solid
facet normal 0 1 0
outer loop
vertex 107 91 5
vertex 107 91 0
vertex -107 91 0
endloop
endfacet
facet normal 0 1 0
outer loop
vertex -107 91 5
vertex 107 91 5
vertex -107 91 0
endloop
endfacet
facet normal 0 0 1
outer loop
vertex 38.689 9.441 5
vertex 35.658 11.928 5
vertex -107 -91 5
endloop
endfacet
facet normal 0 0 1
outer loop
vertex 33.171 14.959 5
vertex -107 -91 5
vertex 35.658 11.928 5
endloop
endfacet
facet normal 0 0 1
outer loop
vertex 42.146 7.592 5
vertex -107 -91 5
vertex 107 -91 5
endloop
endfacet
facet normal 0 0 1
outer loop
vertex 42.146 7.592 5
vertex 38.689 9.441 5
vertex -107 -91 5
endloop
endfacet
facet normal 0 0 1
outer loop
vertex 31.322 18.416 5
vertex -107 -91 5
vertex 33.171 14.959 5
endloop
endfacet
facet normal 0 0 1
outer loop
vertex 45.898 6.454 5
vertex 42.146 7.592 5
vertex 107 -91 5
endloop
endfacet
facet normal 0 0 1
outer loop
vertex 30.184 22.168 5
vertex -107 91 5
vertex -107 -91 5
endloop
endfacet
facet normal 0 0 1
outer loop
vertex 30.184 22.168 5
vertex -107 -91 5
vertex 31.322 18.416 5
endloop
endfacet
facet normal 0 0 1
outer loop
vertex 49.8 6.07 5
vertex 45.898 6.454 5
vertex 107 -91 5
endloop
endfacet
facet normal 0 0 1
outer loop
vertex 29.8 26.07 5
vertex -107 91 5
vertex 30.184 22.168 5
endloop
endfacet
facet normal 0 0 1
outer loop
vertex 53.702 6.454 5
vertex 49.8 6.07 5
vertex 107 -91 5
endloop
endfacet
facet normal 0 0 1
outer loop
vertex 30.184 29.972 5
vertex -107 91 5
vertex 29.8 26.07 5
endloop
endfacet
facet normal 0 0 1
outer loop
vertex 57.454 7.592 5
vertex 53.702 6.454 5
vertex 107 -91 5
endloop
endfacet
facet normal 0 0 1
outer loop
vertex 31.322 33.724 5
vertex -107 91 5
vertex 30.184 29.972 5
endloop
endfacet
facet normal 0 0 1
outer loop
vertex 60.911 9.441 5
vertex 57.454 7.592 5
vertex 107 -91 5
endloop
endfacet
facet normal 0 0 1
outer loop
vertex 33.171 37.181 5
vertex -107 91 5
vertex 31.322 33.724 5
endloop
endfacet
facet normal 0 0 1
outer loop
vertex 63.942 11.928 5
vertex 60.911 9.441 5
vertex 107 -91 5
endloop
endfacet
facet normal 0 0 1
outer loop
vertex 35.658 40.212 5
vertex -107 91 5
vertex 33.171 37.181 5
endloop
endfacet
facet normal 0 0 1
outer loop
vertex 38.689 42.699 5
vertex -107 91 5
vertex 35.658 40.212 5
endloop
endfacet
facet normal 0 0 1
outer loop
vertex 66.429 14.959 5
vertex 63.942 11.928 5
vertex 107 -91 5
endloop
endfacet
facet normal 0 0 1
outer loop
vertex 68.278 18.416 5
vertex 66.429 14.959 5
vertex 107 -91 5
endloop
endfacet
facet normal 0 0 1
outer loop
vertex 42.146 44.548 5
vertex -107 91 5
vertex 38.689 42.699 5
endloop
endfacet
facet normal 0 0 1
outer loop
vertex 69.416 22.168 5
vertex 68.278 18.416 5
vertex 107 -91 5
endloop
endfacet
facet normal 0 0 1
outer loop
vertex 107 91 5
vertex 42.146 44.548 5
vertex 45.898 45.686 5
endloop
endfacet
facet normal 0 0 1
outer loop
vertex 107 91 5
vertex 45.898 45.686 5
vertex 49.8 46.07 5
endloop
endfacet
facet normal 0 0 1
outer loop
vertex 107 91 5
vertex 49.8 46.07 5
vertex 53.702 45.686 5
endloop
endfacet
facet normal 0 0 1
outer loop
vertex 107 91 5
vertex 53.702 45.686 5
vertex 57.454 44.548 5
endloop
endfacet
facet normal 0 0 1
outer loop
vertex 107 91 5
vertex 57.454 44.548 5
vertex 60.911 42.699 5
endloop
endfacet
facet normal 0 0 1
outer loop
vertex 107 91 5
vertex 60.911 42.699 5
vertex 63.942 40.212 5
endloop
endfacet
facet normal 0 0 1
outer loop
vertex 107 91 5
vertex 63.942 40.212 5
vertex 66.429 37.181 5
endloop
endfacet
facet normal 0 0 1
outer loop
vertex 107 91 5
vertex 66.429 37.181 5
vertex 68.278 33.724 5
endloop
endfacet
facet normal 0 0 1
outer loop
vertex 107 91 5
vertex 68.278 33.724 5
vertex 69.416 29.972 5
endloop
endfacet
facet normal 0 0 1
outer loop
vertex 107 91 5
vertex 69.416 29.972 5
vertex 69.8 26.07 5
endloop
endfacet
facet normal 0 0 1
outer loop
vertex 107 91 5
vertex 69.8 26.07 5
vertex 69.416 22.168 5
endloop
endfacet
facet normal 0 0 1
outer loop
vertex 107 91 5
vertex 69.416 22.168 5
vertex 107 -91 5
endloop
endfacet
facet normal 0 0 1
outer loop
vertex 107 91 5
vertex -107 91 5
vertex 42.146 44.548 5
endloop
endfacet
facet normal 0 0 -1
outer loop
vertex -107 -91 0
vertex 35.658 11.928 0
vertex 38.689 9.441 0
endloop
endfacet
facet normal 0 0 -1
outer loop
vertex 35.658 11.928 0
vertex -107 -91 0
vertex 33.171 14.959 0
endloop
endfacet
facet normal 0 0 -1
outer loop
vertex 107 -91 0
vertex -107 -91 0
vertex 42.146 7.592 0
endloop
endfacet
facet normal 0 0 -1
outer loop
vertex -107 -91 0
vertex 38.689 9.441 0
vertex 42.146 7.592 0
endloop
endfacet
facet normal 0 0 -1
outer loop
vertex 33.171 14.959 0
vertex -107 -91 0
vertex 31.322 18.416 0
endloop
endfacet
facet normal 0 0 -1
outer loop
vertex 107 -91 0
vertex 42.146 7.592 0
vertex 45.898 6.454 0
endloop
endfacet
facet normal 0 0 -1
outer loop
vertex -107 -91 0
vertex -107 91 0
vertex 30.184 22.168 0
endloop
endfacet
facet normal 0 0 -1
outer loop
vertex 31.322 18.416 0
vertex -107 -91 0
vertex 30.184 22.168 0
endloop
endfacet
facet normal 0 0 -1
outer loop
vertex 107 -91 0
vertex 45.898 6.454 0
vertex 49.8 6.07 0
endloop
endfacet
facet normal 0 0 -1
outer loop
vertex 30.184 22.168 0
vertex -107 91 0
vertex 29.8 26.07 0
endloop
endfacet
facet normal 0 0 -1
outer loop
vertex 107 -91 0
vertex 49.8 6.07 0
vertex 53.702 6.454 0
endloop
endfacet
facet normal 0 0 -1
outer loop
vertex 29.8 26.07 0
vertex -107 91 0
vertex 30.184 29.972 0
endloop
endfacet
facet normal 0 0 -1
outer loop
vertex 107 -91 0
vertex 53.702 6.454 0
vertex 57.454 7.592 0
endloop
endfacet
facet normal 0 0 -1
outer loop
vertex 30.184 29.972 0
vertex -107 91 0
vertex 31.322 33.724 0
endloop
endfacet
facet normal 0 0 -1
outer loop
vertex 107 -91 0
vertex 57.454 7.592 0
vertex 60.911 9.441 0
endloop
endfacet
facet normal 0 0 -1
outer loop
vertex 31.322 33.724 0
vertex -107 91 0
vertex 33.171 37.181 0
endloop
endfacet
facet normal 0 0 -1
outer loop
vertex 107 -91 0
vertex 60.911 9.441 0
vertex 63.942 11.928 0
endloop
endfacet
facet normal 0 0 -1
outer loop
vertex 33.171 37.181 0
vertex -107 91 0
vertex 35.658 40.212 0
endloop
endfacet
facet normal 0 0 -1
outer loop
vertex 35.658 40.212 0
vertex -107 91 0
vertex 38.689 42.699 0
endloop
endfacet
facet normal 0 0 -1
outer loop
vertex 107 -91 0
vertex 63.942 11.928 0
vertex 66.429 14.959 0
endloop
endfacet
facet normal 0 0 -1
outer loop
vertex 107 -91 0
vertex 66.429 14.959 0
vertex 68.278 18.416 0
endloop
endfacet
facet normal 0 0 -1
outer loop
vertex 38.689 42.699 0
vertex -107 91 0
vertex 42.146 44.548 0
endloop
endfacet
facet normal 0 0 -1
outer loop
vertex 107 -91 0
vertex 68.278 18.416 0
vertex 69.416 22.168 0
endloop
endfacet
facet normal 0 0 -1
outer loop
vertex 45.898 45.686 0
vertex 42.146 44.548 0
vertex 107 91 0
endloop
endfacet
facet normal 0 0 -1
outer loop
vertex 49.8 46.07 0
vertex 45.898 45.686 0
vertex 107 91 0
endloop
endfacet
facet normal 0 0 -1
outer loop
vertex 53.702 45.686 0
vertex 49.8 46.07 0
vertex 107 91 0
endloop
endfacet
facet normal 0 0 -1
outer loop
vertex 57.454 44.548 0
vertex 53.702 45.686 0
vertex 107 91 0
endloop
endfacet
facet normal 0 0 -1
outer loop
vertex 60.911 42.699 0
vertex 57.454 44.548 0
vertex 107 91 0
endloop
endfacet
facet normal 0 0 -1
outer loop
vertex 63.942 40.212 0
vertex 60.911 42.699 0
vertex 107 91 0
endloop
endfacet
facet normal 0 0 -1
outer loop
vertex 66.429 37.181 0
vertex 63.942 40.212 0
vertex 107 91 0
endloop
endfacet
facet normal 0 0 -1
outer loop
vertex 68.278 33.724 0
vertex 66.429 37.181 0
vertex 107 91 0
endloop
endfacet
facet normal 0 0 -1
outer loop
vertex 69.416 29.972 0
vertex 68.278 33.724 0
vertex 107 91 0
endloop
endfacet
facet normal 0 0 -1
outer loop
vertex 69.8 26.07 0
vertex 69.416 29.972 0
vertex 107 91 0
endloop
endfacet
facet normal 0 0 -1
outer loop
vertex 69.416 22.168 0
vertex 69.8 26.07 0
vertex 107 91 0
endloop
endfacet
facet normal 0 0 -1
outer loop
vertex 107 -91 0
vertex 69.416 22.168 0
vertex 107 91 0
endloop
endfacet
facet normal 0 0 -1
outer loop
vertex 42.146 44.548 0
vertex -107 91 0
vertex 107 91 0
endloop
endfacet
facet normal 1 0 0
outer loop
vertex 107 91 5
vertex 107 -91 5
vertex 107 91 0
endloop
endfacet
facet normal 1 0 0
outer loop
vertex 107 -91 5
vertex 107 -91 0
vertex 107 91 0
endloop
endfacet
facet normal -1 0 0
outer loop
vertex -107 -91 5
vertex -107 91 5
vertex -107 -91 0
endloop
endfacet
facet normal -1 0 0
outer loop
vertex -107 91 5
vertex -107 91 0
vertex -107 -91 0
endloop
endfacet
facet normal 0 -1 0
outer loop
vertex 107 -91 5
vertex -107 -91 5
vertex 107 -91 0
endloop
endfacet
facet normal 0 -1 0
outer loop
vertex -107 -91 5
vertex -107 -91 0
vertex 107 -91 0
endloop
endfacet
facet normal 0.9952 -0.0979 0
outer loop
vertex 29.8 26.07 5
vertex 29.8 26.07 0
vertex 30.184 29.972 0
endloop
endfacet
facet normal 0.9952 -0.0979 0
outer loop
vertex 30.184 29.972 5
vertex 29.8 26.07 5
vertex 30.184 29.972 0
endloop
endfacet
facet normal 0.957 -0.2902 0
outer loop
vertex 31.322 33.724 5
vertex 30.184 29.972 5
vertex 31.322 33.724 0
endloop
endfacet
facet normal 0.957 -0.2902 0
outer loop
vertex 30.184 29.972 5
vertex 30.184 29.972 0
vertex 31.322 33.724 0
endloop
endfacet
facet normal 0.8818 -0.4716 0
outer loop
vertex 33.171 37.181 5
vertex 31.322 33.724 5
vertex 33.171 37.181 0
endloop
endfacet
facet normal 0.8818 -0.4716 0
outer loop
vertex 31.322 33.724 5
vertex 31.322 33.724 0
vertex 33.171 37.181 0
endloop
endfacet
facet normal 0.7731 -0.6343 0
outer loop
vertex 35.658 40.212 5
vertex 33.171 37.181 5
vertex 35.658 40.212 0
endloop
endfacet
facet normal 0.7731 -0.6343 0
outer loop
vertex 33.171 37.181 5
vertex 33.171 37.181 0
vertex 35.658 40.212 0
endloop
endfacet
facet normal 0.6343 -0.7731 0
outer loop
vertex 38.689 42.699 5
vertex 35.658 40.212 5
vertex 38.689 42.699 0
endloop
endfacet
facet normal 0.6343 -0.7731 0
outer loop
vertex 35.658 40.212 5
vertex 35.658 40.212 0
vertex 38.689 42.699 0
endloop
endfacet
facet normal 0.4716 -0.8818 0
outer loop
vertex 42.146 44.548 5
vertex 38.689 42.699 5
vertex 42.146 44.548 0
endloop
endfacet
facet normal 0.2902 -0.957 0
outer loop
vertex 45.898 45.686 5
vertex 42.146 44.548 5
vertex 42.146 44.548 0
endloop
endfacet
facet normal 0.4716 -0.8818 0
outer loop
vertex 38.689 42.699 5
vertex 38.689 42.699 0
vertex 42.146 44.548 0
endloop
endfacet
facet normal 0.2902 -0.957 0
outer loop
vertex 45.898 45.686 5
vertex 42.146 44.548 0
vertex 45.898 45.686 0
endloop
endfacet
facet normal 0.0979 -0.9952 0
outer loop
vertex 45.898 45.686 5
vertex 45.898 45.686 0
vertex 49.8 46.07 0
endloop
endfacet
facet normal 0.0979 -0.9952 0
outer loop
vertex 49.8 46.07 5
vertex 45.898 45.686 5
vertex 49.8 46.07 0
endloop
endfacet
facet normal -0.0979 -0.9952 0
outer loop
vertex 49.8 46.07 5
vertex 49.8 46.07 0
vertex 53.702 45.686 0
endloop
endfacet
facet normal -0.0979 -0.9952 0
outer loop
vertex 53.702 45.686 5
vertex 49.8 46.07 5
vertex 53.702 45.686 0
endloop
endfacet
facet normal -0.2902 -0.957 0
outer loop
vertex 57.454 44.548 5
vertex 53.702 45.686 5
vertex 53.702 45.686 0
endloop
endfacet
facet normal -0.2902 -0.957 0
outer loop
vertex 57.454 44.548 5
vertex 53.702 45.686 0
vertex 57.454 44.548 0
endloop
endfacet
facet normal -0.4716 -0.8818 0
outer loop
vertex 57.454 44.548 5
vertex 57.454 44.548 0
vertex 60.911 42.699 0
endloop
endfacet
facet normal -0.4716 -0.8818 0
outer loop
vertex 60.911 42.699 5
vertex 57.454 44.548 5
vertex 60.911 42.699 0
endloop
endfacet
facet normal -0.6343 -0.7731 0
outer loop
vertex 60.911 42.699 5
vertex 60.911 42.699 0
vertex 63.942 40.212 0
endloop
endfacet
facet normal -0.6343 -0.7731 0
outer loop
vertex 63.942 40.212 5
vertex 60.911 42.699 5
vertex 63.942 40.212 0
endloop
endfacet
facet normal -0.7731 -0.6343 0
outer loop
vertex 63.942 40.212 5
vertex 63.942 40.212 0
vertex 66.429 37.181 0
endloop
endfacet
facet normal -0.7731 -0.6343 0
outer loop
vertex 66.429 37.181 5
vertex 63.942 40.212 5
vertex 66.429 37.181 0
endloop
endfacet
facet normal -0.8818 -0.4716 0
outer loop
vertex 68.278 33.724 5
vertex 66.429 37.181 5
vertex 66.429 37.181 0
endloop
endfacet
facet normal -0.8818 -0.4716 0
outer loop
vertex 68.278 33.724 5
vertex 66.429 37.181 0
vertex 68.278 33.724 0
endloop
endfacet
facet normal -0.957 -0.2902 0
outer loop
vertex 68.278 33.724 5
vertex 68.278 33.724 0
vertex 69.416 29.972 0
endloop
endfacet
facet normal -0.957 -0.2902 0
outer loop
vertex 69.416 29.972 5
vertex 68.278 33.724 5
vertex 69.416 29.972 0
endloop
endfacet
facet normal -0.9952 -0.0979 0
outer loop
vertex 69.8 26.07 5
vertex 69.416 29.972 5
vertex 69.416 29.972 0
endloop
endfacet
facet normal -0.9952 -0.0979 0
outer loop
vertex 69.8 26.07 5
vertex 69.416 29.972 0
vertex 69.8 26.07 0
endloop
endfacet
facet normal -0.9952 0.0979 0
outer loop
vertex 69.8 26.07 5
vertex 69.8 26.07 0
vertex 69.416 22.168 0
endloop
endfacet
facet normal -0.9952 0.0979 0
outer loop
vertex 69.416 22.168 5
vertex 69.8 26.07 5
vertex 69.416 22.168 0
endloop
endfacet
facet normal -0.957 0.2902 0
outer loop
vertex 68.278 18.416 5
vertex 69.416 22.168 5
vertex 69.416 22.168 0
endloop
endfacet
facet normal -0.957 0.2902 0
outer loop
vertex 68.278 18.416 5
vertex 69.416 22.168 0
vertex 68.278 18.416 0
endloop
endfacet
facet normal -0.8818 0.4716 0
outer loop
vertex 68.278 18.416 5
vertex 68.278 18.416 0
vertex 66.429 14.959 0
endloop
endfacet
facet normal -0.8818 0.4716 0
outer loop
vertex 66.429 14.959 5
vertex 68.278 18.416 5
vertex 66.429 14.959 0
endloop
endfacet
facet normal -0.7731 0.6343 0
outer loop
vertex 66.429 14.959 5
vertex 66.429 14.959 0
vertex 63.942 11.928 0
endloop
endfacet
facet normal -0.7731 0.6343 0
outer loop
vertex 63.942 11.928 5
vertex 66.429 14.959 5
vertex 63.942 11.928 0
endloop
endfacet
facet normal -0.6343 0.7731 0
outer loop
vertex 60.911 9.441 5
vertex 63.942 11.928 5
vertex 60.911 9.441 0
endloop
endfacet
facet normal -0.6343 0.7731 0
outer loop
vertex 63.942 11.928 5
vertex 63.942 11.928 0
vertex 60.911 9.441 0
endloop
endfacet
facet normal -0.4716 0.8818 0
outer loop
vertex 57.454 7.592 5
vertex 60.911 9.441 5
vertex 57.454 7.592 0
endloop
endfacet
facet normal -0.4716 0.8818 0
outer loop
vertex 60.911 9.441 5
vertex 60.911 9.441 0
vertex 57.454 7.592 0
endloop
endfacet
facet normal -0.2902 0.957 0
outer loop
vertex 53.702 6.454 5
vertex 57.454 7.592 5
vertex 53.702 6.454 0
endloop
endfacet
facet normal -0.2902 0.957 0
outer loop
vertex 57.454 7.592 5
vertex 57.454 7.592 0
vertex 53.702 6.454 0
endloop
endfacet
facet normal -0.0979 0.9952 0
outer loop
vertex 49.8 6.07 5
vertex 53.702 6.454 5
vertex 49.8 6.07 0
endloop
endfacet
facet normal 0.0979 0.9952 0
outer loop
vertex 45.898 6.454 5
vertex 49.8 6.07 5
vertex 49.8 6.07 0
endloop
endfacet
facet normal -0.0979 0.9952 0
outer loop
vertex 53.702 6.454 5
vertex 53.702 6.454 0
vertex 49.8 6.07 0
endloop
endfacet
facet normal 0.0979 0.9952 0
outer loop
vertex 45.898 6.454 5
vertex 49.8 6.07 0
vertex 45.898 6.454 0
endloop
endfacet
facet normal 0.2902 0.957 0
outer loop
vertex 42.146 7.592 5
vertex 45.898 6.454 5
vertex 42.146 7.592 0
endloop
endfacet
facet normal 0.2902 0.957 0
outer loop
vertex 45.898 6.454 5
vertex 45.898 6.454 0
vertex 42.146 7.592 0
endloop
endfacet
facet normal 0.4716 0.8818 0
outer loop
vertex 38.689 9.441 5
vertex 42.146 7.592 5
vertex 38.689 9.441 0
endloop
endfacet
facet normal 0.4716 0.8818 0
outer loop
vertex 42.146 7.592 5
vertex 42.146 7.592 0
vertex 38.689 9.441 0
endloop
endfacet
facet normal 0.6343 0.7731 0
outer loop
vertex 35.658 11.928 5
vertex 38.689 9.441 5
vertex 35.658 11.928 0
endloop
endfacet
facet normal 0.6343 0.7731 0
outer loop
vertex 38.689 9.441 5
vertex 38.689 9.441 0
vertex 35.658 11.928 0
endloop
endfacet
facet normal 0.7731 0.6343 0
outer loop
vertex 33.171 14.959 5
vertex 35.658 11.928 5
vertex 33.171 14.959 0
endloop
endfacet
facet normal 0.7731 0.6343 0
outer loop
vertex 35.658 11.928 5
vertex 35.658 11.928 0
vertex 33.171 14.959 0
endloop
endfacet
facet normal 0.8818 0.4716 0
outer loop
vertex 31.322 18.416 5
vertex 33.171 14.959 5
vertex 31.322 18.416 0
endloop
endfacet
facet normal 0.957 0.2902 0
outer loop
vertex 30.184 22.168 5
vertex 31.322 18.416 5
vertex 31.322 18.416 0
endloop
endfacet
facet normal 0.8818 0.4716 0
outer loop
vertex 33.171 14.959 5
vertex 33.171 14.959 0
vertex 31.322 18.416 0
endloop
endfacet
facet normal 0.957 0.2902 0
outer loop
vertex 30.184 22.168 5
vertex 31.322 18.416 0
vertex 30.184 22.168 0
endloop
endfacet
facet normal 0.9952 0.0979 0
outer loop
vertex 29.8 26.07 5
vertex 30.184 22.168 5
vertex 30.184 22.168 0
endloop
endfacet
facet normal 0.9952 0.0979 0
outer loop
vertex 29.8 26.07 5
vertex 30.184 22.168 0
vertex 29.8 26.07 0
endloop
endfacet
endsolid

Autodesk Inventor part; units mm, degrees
ref_plane "YZ Plane" through (0, 0, 0) normal (1, 0, 0) x (0, 1, 0)
ref_plane "XZ Plane" through (0, 0, 0) normal (0, 1, 0) x (-1, 0, 0)
ref_plane "XY Plane" through (0, 0, 0) normal (0, 0, 1) x (1, 0, 0)
sketch "Sketch1" plane through (0, 0, 0) normal (0, 0, 1) x (1, 0, 0)
  line L0 (-107, -91) -> (107, -91)
  line L1 (107, -91) -> (107, 91)
  line L2 (107, 91) -> (-107, 91)
  line L3 (-107, 91) -> (-107, -91)
  line L4 (-107, -91) -> (107, 91) construction
  line L5 (107, -91) -> (-107, 91) construction
  point P0 (0, 0)
  dimension "d0" = 214
  dimension "d1" = 182
extrude "Extrusion1" add sketch "Sketch1" along normal blind 5
sketch "Sketch2" plane through (0, 0, 0) normal (0, 0, -1) x (-1, 0, 0)
  circle A0 centre (-49.8, 26.07) radius 20
  line L0 (-107, -91) -> (-107, 91) projected
  line L1 (107, -91) -> (-107, -91) projected
  point P0 (0, 0)
  dimension "d4" = 57.2
  dimension "d5" = 40
  dimension "d6" = 117.07
extrude "Extrusion2" cut sketch "Sketch2" against normal blind 5
properties part number "tapa_arriba"
